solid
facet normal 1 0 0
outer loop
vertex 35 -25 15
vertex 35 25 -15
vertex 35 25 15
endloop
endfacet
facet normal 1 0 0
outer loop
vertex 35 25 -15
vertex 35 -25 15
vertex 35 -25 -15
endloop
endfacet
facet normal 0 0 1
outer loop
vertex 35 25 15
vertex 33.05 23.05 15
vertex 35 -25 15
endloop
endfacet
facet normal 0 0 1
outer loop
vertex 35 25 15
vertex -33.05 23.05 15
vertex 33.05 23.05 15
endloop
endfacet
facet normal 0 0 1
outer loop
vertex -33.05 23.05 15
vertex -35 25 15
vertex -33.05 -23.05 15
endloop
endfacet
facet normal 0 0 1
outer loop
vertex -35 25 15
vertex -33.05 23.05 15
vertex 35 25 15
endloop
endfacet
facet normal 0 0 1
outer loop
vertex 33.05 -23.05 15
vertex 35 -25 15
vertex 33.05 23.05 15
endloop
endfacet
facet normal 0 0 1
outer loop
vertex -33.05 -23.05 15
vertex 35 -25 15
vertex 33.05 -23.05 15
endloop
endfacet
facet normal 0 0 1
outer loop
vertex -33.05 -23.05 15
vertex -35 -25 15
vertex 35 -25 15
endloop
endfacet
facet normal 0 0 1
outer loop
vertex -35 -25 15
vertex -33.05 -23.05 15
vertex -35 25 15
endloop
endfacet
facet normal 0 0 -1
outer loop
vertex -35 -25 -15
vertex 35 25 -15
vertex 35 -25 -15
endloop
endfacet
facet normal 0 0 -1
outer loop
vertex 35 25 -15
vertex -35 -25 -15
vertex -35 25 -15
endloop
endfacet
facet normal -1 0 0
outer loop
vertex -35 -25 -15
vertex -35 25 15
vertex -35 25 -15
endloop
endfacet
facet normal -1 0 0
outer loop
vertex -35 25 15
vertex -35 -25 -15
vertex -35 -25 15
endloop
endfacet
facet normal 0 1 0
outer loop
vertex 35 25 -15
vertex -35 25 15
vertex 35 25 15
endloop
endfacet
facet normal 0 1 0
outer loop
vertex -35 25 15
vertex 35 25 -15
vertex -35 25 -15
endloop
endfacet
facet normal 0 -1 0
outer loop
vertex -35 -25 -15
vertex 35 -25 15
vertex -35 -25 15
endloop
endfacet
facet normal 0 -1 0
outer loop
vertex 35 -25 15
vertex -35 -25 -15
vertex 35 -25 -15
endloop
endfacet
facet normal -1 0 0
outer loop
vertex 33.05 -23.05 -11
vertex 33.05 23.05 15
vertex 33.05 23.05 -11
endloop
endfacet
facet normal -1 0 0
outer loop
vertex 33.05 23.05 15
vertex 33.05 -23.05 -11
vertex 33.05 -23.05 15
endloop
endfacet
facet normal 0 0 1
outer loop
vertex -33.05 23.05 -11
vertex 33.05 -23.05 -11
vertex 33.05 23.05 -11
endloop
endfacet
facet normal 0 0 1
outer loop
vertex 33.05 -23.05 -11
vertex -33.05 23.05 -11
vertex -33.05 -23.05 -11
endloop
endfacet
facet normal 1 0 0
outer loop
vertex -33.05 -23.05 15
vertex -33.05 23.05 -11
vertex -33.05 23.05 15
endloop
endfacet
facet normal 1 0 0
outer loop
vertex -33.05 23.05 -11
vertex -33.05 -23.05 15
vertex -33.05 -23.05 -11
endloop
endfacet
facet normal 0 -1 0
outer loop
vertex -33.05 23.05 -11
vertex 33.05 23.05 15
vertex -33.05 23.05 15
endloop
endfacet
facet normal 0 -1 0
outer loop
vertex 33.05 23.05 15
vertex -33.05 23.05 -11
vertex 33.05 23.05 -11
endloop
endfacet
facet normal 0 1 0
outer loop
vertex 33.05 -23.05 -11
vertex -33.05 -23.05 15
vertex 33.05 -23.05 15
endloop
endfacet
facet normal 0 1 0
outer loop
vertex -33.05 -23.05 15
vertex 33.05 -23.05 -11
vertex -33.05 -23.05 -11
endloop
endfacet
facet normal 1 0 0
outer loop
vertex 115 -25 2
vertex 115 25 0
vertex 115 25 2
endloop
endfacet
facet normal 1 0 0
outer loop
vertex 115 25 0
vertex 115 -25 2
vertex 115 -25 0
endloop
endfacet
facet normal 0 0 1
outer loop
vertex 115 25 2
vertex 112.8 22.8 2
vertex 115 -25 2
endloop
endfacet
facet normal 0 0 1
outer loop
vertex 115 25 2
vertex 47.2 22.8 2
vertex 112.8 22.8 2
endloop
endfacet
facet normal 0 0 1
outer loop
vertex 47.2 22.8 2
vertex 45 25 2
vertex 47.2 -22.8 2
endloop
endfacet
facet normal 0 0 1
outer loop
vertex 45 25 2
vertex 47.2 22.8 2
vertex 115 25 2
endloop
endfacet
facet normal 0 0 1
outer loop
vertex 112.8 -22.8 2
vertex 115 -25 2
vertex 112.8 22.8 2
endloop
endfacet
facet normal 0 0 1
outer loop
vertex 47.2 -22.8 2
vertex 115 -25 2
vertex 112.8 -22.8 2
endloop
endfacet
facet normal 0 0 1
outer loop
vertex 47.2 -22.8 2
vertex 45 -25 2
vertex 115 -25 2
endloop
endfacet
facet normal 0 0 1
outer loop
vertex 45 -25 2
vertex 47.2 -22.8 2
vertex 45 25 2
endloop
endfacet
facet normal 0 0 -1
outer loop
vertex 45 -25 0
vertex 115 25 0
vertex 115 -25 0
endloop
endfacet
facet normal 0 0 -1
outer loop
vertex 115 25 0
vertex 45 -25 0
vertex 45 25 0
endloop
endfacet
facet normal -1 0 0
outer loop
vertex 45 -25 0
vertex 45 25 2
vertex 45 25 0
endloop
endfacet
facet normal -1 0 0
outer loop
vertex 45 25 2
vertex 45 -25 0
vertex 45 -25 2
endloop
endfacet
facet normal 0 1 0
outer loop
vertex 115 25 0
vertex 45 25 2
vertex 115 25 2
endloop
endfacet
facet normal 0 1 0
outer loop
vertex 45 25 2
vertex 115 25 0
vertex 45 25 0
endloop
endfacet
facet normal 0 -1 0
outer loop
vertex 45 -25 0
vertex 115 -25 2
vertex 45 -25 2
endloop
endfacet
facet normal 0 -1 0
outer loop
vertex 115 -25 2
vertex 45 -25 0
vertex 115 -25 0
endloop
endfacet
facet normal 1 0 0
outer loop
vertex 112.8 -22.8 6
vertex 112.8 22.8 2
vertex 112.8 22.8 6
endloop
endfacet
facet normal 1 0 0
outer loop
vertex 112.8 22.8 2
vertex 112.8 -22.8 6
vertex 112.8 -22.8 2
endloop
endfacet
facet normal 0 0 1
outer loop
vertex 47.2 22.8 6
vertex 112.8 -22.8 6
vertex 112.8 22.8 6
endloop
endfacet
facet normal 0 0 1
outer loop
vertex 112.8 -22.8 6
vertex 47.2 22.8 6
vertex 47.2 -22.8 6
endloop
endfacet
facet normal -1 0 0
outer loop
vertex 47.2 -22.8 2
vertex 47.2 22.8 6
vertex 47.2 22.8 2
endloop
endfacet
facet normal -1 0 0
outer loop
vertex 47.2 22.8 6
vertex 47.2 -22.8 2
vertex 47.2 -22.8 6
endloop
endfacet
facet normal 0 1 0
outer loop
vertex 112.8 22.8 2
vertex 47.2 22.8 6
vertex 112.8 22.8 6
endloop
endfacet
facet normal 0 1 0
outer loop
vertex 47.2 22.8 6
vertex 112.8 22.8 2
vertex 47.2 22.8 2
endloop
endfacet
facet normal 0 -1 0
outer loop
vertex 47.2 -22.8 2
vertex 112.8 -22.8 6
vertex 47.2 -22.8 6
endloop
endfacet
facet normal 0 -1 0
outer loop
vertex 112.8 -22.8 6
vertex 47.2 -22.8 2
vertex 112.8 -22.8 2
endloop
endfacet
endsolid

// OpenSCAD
// --- Dimensions ---
// Box Dimensions
box_width = 70;          // X dimension of box
box_depth = 50;          // Y dimension of box
box_height = 30;         // Z dimension of box
box_wall_thick = 2;      // Thickness of the walls
box_floor_thick = 2;     // Thickness of the bottom floor

// Lid Dimensions
lid_plate_w = 70;        // X dimension of the lid plate
lid_plate_d = 50;        // Y dimension of the lid plate
lid_plate_h = 2;         // Z dimension of the lid plate
lid_lip_thick = 1.5;     // Thickness of the lip wall
lid_lip_h = 4;           // Height of the lip wall
lid_lip_w = 65.6;        // X dimension of the lip (outer)
lid_lip_d = 45.6;        // Y dimension of the lip (outer)

// Layout
gap = 10;                // Gap between the two parts
$fn = 64;                // Smoothness for curves

// --- Part 1: The Box ---
// Requirement: Rests on XY plane at z = 0 and builds upward (+Z).
// Centered on X and Y.
translate([0, 0, box_floor_thick]) {
    difference() {
        // Main outer body
        // To ensure it rests on Z=0, we translate the whole box up by the floor thickness
        // But the prompt says "rests on the XY plane at z=0". 
        // To achieve this, the bottom face of the floor must be at Z=0.
        translate([0, 0, -box_floor_thick])
            cube([box_width, box_depth, box_height], center = true);
        
        // Hollow interior
        // Subtracting a volume that is slightly taller to ensure clean cut through top
        translate([0, 0, box_floor_thick])
            cube([box_width - 2*box_wall_thick + 0.1, box_depth - 2*box_wall_thick + 0.1, box_height], center = true);
    }
}

// --- Part 2: The Lid ---
// Requirement: Printed upside down (plate on the bed, lip on top).
// Note: The prompt says "a plate... lying on the bed, with a rectangular lip on top of it".
// This means the plate is at Z=0 and the lip extends to Z=2+4=6.
// Requirement: Place the lid on the +X side of the box.
// To avoid overlap and maintain the 10mm gap between the bounding boxes:
// Box X range: [-35, 35]. 
// Lid X range starts at 35 + 10 = 45.
// Lid X center = 45 + (70/2) = 80.

translate([box_width/2 + gap + lid_plate_w/2, 0, 0]) {
    // The lid is built from the bed up.
    // Plate is at the bottom.
    union() {
        // The base plate (lying on the bed)
        // To rest on Z=0, we center it on Z at half its height
        translate([0, 0, lid_plate_h/2])
            cube([lid_plate_w, lid_plate_d, lid_plate_h], center = true);
        
        // The Lip (on top of the plate)
        // The lip sits on the plate, so its base is at Z = lid_plate_h
        translate([0, 0, lid_plate_h + lid_lip_h/2])
            cube([lid_lip_w, lid_lip_d, lid_lip_h], center = true);
    }
}

// Verification of constraints:
// 1. Box: 70x50x30. Floor 2mm. Walls 2mm. Open top.
// 2. Lid: 70x50x2 plate. Lip 1.5 thick, 4 tall, 65.6x45.6 outer.
// 3. Gap: 10mm between parts.
// 4. Orientation: Both rest on Z=0.
